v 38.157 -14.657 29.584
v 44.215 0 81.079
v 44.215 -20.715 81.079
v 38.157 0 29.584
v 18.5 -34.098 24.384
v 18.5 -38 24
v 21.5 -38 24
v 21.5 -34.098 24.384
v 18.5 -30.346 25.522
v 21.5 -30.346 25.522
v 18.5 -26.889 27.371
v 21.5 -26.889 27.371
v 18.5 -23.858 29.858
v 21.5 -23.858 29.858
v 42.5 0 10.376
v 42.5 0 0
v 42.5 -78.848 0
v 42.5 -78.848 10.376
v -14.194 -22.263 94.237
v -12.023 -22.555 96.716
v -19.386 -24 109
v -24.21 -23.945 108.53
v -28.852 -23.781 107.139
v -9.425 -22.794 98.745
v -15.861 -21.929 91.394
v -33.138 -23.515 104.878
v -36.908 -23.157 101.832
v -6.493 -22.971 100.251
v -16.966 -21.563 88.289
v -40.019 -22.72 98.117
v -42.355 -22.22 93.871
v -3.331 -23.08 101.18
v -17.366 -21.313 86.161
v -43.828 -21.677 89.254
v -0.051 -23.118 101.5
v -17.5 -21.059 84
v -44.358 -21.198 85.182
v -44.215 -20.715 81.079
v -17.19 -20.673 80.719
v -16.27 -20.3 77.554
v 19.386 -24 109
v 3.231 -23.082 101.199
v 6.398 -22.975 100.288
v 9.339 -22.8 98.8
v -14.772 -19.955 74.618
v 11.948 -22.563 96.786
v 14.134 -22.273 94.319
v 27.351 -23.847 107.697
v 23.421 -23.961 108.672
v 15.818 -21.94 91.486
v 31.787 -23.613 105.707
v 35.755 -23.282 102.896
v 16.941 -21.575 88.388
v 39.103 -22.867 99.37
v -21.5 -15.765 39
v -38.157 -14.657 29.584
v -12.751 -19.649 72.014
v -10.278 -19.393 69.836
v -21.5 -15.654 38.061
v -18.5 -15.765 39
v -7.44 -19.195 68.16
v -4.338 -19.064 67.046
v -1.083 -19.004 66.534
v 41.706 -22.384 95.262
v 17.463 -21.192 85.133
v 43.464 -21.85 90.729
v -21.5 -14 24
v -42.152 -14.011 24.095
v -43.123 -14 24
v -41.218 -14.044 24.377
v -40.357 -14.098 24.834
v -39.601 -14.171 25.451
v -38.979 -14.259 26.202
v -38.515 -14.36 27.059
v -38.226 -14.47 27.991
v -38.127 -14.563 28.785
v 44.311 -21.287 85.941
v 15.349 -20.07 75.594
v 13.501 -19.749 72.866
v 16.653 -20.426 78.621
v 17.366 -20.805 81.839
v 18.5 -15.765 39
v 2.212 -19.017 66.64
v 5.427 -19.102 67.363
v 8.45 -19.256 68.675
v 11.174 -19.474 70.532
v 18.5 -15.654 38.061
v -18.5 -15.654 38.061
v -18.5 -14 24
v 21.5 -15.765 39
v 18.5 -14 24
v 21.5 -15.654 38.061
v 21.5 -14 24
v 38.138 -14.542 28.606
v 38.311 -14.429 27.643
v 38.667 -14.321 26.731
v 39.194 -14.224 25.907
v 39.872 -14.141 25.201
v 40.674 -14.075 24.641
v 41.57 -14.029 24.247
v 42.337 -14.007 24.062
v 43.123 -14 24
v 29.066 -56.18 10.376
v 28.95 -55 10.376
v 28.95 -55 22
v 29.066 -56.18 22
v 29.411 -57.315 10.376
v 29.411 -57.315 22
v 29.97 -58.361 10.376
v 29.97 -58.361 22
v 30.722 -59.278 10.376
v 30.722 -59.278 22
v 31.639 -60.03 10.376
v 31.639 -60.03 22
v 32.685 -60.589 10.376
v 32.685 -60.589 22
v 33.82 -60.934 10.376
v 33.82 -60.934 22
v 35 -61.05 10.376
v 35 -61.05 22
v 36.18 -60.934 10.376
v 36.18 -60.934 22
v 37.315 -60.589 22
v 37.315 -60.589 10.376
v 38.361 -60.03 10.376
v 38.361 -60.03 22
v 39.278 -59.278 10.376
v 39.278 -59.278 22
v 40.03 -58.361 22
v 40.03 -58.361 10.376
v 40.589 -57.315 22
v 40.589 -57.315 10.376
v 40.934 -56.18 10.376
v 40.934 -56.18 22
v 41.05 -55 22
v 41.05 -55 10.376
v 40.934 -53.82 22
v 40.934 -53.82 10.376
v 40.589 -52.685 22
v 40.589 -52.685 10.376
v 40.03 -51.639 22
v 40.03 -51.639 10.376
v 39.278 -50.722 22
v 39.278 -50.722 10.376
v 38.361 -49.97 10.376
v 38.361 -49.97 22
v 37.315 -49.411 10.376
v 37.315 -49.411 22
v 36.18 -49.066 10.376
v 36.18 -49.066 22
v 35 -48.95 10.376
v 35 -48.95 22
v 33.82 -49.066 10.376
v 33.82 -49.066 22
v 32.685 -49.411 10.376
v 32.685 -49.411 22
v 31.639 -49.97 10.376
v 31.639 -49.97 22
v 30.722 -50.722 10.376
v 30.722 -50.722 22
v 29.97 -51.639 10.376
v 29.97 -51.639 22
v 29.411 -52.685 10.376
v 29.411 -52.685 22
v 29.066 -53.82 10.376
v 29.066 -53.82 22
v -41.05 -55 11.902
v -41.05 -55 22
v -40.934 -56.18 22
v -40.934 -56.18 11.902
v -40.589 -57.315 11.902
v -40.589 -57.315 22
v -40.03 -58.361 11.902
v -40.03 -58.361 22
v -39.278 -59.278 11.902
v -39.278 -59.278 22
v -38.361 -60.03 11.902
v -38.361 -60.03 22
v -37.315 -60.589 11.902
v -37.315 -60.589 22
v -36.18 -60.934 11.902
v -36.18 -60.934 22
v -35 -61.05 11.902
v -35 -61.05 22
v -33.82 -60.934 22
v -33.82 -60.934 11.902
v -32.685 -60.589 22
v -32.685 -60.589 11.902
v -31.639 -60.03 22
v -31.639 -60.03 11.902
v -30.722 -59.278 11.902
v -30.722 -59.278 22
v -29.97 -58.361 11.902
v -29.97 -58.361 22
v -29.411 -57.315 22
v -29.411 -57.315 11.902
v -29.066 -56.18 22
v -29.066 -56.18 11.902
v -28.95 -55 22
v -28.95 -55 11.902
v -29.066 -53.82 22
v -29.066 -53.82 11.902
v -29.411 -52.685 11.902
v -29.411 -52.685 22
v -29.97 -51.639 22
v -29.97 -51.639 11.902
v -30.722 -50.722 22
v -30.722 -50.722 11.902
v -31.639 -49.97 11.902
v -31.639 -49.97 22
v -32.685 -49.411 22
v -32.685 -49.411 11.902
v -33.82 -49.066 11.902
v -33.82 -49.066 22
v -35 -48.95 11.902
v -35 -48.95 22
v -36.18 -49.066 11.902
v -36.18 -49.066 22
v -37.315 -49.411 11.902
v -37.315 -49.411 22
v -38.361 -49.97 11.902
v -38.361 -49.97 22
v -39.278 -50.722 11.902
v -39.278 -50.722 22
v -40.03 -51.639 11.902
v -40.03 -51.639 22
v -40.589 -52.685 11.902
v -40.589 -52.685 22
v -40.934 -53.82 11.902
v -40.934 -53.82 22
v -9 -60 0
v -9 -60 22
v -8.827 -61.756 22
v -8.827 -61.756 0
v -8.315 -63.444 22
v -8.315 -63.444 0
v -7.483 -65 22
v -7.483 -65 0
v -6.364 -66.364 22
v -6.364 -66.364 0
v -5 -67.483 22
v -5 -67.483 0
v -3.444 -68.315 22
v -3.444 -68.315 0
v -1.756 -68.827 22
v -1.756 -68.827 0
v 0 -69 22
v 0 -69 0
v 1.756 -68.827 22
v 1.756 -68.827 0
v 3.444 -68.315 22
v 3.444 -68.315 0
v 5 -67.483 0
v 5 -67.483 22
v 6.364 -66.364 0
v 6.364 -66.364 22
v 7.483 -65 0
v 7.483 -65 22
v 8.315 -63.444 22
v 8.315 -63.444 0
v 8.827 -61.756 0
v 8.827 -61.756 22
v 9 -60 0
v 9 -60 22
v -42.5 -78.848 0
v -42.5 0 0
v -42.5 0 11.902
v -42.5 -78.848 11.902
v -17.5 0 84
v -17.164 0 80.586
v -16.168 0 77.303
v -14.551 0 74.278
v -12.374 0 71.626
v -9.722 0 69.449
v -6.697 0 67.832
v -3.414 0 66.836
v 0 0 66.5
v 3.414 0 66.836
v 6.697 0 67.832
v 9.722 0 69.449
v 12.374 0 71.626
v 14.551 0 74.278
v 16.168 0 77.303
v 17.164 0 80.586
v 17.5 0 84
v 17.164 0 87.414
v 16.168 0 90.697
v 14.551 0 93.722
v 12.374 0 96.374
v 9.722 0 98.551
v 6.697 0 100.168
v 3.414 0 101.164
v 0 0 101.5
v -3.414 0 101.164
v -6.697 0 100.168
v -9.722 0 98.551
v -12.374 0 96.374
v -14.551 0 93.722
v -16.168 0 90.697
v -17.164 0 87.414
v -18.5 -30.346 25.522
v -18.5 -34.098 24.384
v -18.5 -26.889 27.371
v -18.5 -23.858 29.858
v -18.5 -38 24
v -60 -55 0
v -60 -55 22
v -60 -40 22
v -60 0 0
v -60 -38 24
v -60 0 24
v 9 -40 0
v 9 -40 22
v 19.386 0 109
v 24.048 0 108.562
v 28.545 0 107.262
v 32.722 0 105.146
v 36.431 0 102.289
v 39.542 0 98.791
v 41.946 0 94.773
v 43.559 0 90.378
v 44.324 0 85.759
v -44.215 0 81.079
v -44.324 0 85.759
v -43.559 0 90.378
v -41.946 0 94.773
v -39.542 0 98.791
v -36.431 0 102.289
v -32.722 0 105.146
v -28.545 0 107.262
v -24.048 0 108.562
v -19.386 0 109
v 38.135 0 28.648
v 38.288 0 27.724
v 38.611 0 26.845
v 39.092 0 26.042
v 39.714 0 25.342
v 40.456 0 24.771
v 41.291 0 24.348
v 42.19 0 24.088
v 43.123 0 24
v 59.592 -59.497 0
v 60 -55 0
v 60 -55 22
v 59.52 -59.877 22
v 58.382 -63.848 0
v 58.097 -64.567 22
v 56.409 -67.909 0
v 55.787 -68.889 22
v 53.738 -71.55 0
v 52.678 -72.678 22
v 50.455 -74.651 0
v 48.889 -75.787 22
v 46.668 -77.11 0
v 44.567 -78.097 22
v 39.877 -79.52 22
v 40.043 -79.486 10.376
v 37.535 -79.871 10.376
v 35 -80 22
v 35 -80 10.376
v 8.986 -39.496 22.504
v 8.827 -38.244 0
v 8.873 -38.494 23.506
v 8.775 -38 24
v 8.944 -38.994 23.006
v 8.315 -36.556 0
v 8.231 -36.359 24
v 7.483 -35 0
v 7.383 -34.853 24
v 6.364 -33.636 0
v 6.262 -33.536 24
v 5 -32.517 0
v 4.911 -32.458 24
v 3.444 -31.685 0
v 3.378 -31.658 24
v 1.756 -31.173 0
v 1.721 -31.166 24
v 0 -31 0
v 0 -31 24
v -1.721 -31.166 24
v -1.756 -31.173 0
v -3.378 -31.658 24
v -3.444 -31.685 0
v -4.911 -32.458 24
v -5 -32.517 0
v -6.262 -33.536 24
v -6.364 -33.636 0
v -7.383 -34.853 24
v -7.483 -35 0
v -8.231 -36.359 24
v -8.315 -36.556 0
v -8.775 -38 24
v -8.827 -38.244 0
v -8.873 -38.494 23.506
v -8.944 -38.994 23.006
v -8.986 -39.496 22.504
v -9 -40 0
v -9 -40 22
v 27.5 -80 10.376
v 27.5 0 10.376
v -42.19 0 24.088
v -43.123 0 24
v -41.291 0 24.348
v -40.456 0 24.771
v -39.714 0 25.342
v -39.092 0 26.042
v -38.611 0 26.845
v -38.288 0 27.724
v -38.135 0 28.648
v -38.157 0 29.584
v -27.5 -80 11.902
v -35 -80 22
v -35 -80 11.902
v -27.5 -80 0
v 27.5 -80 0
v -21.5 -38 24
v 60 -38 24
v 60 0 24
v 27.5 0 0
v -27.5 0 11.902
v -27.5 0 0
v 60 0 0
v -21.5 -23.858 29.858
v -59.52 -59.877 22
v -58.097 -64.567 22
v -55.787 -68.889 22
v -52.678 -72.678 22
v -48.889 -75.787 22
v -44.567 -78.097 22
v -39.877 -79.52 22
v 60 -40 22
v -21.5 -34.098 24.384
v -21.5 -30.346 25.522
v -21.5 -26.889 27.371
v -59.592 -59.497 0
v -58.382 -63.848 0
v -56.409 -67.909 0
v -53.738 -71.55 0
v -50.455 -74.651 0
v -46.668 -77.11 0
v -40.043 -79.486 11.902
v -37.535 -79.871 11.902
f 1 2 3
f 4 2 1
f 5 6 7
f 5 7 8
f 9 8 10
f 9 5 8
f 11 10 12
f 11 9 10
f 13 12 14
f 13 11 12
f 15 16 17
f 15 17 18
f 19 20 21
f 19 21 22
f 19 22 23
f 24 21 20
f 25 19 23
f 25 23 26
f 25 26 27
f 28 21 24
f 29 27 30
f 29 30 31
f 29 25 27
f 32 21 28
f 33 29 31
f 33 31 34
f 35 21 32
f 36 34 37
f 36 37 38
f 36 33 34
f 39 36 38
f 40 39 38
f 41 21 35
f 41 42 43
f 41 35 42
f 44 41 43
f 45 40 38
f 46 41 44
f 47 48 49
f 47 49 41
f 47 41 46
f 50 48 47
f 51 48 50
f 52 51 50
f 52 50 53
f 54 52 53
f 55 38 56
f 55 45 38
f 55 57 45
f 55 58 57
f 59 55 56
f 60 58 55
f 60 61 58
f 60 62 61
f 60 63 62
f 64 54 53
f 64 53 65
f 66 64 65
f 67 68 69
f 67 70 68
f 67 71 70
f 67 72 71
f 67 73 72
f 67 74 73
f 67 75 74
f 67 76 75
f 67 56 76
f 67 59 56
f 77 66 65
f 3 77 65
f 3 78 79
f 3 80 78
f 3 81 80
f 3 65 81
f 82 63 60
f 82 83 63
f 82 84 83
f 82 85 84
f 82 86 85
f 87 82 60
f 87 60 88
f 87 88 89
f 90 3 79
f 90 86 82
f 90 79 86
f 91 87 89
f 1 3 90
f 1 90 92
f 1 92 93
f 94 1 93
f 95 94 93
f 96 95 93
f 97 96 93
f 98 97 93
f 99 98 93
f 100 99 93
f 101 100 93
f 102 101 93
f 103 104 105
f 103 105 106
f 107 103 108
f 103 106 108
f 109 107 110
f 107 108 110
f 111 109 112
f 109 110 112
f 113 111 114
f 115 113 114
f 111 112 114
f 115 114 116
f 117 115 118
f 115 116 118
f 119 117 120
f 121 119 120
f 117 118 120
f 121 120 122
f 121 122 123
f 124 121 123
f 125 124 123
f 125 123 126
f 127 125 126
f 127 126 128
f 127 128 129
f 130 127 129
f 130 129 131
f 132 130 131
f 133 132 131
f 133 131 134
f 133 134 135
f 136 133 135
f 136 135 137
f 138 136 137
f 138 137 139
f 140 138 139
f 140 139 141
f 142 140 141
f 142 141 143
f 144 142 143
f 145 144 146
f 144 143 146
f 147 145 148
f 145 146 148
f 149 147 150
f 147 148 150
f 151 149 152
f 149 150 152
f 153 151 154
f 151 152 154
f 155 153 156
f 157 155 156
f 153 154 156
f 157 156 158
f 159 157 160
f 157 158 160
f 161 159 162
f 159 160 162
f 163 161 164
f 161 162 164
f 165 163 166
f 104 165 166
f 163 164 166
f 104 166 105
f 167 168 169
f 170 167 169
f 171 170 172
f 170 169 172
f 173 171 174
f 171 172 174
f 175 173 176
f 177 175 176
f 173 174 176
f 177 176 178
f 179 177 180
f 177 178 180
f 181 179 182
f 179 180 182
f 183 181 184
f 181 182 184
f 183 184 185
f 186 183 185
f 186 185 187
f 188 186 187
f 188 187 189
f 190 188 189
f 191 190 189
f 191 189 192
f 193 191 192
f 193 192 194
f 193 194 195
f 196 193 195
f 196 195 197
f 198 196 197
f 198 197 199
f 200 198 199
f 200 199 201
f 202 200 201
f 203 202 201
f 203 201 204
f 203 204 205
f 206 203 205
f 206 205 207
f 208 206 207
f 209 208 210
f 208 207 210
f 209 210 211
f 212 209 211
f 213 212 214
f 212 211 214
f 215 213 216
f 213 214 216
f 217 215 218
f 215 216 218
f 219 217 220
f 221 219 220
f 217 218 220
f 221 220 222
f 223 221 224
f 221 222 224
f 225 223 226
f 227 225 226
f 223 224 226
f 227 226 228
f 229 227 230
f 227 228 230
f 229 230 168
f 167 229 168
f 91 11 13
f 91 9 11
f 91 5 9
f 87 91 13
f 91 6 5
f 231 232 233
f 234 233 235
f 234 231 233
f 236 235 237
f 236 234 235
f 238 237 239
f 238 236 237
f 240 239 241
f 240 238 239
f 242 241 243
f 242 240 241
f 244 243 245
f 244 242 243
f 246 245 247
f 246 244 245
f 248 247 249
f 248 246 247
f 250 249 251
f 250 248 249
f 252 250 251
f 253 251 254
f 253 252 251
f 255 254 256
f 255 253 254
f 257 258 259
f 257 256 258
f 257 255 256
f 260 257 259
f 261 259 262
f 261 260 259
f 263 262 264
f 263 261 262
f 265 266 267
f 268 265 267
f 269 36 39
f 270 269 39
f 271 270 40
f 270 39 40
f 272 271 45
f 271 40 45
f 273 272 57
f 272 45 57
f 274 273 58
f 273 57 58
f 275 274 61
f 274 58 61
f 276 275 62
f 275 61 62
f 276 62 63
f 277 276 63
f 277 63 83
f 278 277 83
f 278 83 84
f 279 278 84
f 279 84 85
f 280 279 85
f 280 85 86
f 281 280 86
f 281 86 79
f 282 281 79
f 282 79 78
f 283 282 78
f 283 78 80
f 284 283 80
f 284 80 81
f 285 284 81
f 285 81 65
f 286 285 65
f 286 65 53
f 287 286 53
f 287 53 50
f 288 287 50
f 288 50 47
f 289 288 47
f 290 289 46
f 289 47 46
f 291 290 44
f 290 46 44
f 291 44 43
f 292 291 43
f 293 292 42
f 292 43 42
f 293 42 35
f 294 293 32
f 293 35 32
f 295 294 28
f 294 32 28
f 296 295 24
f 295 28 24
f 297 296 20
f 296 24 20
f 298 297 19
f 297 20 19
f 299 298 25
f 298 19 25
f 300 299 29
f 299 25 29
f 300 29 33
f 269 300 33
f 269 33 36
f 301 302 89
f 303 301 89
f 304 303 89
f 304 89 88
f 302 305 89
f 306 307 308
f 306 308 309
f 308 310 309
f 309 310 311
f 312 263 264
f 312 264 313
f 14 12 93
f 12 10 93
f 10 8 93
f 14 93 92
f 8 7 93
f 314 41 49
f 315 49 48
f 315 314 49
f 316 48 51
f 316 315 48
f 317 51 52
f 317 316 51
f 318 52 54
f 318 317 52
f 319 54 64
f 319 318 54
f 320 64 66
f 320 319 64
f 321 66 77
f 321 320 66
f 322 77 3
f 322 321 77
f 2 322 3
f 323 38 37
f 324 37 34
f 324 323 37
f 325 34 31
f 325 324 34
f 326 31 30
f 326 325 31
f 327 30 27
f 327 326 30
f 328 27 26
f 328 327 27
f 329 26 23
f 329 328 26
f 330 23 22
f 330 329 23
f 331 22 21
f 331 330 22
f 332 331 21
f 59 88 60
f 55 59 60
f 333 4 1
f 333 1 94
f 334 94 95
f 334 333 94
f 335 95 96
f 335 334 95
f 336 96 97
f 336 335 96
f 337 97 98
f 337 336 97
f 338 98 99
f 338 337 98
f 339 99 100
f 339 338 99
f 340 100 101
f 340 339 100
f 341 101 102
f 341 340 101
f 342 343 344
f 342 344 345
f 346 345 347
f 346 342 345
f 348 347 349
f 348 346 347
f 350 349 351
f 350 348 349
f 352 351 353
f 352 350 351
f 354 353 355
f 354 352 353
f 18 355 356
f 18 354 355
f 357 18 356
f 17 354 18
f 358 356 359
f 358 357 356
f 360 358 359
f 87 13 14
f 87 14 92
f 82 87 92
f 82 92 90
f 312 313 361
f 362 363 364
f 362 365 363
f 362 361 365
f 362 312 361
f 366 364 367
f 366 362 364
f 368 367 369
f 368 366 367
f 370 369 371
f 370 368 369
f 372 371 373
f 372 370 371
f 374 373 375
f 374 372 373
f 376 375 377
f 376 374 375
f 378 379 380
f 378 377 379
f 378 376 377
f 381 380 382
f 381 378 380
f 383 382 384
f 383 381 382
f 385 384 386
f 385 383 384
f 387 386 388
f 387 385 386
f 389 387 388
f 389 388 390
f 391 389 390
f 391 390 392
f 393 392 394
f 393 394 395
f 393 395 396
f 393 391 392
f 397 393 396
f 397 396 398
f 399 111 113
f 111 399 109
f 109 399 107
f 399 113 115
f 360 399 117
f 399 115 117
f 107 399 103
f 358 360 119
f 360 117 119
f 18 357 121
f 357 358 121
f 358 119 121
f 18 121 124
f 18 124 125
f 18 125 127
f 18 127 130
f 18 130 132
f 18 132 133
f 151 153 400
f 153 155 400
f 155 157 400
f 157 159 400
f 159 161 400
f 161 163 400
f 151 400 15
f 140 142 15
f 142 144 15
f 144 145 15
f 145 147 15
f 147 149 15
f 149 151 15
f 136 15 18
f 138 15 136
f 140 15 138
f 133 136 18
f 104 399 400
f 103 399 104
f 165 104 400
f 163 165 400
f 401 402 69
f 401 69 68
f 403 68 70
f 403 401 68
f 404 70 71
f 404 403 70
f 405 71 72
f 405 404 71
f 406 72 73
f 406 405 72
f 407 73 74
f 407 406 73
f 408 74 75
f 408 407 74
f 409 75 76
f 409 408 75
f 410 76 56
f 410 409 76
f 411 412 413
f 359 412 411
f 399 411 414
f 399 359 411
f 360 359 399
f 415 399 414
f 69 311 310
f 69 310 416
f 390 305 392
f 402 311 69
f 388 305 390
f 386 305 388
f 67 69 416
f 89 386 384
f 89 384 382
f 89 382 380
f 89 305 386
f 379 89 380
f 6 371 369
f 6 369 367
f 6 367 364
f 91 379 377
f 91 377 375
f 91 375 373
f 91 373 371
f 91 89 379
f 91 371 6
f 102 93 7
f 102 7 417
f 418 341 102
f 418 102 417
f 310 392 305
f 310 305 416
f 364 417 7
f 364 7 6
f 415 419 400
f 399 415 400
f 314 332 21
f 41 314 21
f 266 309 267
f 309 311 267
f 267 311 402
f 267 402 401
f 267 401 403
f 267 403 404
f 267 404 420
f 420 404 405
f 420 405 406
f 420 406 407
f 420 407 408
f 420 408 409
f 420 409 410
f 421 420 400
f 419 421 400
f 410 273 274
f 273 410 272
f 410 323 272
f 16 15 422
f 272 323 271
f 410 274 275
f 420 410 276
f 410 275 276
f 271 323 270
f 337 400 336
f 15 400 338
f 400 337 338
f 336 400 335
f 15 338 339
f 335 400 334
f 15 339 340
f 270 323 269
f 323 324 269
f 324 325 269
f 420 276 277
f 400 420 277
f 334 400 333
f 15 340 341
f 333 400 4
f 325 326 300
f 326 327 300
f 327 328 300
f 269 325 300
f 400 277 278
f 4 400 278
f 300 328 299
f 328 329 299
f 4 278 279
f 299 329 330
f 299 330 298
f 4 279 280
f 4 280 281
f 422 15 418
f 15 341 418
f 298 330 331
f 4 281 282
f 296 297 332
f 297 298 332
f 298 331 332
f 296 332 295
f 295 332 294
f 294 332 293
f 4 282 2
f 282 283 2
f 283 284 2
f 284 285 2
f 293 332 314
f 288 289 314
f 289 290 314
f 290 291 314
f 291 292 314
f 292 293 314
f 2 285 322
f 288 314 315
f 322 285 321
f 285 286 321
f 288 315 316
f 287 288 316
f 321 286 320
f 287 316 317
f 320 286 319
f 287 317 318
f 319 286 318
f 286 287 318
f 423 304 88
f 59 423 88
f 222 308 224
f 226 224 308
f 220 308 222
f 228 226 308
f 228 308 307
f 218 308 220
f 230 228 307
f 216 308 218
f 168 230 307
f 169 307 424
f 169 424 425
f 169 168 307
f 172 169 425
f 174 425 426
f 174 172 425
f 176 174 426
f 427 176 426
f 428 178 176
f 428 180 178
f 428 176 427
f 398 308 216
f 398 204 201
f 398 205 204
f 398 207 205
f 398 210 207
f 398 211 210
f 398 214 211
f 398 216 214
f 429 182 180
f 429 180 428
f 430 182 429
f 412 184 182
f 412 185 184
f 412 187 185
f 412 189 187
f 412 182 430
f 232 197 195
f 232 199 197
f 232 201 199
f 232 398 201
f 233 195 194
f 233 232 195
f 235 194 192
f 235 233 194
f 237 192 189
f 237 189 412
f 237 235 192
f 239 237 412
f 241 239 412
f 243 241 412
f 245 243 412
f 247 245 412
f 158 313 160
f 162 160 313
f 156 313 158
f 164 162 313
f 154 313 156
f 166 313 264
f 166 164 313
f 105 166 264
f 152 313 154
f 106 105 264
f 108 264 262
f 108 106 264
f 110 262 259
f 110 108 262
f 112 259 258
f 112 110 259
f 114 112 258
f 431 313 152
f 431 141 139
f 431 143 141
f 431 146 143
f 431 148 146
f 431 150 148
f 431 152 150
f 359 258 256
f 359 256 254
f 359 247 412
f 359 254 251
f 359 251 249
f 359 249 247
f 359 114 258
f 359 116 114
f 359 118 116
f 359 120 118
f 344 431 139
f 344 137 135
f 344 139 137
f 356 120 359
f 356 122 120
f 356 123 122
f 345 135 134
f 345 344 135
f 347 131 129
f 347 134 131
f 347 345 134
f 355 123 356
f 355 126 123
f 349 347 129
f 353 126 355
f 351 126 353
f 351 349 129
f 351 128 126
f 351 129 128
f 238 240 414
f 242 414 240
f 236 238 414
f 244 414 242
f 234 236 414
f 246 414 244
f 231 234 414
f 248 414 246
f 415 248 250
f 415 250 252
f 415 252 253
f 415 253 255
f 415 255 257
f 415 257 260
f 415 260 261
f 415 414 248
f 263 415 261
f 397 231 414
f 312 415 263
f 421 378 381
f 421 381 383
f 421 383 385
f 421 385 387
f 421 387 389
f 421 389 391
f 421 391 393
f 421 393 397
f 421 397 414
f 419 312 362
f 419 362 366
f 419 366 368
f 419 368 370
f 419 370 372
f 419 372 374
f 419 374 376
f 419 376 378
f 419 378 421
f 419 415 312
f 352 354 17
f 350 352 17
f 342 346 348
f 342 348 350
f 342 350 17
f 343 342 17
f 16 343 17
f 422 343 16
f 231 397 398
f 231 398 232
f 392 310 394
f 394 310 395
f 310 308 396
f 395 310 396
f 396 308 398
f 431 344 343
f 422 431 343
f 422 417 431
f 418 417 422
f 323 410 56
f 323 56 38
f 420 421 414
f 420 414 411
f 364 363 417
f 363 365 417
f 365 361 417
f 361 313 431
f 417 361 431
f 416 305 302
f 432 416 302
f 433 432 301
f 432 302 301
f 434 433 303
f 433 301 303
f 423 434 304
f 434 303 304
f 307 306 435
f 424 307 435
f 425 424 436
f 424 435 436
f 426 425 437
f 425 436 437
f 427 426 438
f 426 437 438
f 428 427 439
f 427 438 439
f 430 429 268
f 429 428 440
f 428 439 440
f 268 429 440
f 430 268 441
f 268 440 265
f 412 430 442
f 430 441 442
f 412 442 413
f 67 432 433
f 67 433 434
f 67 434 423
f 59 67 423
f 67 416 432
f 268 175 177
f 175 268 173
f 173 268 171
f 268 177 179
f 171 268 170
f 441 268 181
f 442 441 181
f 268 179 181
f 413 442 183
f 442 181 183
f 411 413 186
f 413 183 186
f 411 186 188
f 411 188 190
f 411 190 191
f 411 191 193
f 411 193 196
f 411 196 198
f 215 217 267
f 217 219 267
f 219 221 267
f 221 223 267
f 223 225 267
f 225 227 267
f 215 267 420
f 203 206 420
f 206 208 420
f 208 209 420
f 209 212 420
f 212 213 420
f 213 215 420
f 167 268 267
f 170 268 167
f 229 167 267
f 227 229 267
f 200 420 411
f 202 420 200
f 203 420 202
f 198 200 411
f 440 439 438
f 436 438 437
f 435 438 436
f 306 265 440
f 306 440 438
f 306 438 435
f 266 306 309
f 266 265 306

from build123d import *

# Parameters (mm, degrees)
F1_DEPTH      = 60
F2_W          = 15
F2_H          = 11.9018135592
F2_H_2        = 10.3764180094
F3_DEPTH      = 80.001
F5_DEPTH      = 80.001
F6_W          = 3
F6_H          = 15
F7_DEPTH      = 40
F9_DEPTH      = 60.001
F9_DEPTH_BACK = 60.001
F11_D         = 12.1
F13_DEPTH     = 109.001
F15_D         = 35
F16_R         = 25
F17_SIZE      = 1.99999


# Not quite as in the source:
# - a fillet or chamfer is up to 0.001 mm smaller than in the source, because OpenCascade refuses the exact size


with BuildPart() as f1:
    # F0 (on Right) → F1 (new body, symmetric)
    with BuildSketch(Plane.YZ):
        Polygon((-80, 0), (0, 0), (0, 109), (-24, 109), (-14.0000553612, 24), (-40, 24), (-40, 22), (-80, 22), align=None)
    extrude(amount=F1_DEPTH, both=True)

    # F2 (on Front) → F3 (cut, through all)
    with BuildSketch(Plane.XZ):
        with Locations((-35, 5.9509067796)):
            Rectangle(F2_W, F2_H)
        with Locations((35, 5.1882090047)):
            Rectangle(F2_W, F2_H_2)
    extrude(amount=F3_DEPTH, mode=Mode.SUBTRACT)

    # F4 (on Front) → F5 (cut, through all)
    with BuildSketch(Plane.XZ):
        with BuildLine():
            ThreePointArc((-43.1227148243, 24), (-39.3863385559, 25.6774268435), (-38.1569614274, 29.5842030478))
            Line((-38.1569614274, 29.5842030478), (-44.2151375018, 81.0789847612))
            ThreePointArc((-44.2151375018, 81.0789847612), (-38.0682518594, 100.6128657827), (-19.3863705172, 109))
            Line((-19.3863705172, 109), (0, 109))
            Line((0, 109), (19.3863705172, 109))
            ThreePointArc((19.3863705172, 109), (38.0682518594, 100.6128657827), (44.2151375018, 81.0789847612))
            Line((44.2151375018, 81.0789847612), (38.1569614274, 29.5842030478))
            ThreePointArc((38.1569614274, 29.5842030478), (39.3863385559, 25.6774268435), (43.1227148243, 24))
            Line((43.1227148243, 24), (60, 24))
            Line((60, 24), (60, 136.873498559))
            Line((60, 136.873498559), (-60, 136.873498559))
            Line((-60, 136.873498559), (-60, 24))
            Line((-60, 24), (-43.1227148243, 24))
        make_face()
    extrude(amount=F5_DEPTH, mode=Mode.SUBTRACT)

    # F6 (on Front) → F7 (join, through all)
    with BuildSketch(Plane.XZ):
        with Locations((-20, 31.5)):
            Rectangle(F6_W, F6_H)
        with Locations((20, 31.5)):
            Rectangle(F6_W, F6_H)
    extrude(amount=F7_DEPTH)

    # F8 (on Right) → F9 (cut, two sides)
    with BuildSketch(Plane.YZ) as f9_sk:
        with BuildLine():
            Line((-23.8578643763, 29.8578643763), (-15.6543285765, 38.061400176))
            Line((-15.6543285765, 38.061400176), (-16.3282091593, 43.7894168409))
            Line((-16.3282091593, 43.7894168409), (-43.991163373, 43.7894168409))
            Line((-43.991163373, 43.7894168409), (-43.991163373, 24))
            Line((-43.991163373, 24), (-38, 24))
            ThreePointArc((-38, 24), (-30.3463313527, 25.5224093498), (-23.8578643763, 29.8578643763))
        make_face()
    extrude(amount=-F9_DEPTH, mode=Mode.SUBTRACT)
    extrude(f9_sk.sketch, amount=F9_DEPTH_BACK, mode=Mode.SUBTRACT)

    # F11 (through all)
    with Locations(Plane(origin=(0, 0, 0), x_dir=(1, 0, 0), z_dir=(0, 0, -1))):
        with Locations((-35, 55), (35, 55)):
            Hole(F11_D / 2)

    # F12 (on Top) → F13 (cut, through all)
    with BuildSketch(Plane.XY):
        with BuildLine():
            Line((-9, -40), (-9, -60))
            ThreePointArc((-9, -60), (0, -69), (9, -60))
            Line((9, -60), (9, -40))
            ThreePointArc((9, -40), (0, -31), (-9, -40))
        make_face()
    extrude(amount=F13_DEPTH, mode=Mode.SUBTRACT)

    # F15 (through all)
    with Locations(Plane(origin=(0, 0, 0), x_dir=(1, 0, 0), z_dir=(0, 1, 0))):
        with Locations((0, -84)):
            Hole(F15_D / 2)

    # F16
    f16_edges = [f1.edges().sort_by_distance(p)[0] for p in [
        (-60, -80, 11),
        (60, -80, 11),
    ]]
    fillet(f16_edges, radius=F16_R)

    # F17 (size 2 in the source; OpenCascade refuses exactly that, so slightly less here)
    f17_edges = [f1.edges().sort_by_distance(p)[0] for p in [
        (34.5, -40, 24),
        (-34.5, -40, 24),
    ]]
    chamfer(f17_edges, length=F17_SIZE)


solid = f1.part
